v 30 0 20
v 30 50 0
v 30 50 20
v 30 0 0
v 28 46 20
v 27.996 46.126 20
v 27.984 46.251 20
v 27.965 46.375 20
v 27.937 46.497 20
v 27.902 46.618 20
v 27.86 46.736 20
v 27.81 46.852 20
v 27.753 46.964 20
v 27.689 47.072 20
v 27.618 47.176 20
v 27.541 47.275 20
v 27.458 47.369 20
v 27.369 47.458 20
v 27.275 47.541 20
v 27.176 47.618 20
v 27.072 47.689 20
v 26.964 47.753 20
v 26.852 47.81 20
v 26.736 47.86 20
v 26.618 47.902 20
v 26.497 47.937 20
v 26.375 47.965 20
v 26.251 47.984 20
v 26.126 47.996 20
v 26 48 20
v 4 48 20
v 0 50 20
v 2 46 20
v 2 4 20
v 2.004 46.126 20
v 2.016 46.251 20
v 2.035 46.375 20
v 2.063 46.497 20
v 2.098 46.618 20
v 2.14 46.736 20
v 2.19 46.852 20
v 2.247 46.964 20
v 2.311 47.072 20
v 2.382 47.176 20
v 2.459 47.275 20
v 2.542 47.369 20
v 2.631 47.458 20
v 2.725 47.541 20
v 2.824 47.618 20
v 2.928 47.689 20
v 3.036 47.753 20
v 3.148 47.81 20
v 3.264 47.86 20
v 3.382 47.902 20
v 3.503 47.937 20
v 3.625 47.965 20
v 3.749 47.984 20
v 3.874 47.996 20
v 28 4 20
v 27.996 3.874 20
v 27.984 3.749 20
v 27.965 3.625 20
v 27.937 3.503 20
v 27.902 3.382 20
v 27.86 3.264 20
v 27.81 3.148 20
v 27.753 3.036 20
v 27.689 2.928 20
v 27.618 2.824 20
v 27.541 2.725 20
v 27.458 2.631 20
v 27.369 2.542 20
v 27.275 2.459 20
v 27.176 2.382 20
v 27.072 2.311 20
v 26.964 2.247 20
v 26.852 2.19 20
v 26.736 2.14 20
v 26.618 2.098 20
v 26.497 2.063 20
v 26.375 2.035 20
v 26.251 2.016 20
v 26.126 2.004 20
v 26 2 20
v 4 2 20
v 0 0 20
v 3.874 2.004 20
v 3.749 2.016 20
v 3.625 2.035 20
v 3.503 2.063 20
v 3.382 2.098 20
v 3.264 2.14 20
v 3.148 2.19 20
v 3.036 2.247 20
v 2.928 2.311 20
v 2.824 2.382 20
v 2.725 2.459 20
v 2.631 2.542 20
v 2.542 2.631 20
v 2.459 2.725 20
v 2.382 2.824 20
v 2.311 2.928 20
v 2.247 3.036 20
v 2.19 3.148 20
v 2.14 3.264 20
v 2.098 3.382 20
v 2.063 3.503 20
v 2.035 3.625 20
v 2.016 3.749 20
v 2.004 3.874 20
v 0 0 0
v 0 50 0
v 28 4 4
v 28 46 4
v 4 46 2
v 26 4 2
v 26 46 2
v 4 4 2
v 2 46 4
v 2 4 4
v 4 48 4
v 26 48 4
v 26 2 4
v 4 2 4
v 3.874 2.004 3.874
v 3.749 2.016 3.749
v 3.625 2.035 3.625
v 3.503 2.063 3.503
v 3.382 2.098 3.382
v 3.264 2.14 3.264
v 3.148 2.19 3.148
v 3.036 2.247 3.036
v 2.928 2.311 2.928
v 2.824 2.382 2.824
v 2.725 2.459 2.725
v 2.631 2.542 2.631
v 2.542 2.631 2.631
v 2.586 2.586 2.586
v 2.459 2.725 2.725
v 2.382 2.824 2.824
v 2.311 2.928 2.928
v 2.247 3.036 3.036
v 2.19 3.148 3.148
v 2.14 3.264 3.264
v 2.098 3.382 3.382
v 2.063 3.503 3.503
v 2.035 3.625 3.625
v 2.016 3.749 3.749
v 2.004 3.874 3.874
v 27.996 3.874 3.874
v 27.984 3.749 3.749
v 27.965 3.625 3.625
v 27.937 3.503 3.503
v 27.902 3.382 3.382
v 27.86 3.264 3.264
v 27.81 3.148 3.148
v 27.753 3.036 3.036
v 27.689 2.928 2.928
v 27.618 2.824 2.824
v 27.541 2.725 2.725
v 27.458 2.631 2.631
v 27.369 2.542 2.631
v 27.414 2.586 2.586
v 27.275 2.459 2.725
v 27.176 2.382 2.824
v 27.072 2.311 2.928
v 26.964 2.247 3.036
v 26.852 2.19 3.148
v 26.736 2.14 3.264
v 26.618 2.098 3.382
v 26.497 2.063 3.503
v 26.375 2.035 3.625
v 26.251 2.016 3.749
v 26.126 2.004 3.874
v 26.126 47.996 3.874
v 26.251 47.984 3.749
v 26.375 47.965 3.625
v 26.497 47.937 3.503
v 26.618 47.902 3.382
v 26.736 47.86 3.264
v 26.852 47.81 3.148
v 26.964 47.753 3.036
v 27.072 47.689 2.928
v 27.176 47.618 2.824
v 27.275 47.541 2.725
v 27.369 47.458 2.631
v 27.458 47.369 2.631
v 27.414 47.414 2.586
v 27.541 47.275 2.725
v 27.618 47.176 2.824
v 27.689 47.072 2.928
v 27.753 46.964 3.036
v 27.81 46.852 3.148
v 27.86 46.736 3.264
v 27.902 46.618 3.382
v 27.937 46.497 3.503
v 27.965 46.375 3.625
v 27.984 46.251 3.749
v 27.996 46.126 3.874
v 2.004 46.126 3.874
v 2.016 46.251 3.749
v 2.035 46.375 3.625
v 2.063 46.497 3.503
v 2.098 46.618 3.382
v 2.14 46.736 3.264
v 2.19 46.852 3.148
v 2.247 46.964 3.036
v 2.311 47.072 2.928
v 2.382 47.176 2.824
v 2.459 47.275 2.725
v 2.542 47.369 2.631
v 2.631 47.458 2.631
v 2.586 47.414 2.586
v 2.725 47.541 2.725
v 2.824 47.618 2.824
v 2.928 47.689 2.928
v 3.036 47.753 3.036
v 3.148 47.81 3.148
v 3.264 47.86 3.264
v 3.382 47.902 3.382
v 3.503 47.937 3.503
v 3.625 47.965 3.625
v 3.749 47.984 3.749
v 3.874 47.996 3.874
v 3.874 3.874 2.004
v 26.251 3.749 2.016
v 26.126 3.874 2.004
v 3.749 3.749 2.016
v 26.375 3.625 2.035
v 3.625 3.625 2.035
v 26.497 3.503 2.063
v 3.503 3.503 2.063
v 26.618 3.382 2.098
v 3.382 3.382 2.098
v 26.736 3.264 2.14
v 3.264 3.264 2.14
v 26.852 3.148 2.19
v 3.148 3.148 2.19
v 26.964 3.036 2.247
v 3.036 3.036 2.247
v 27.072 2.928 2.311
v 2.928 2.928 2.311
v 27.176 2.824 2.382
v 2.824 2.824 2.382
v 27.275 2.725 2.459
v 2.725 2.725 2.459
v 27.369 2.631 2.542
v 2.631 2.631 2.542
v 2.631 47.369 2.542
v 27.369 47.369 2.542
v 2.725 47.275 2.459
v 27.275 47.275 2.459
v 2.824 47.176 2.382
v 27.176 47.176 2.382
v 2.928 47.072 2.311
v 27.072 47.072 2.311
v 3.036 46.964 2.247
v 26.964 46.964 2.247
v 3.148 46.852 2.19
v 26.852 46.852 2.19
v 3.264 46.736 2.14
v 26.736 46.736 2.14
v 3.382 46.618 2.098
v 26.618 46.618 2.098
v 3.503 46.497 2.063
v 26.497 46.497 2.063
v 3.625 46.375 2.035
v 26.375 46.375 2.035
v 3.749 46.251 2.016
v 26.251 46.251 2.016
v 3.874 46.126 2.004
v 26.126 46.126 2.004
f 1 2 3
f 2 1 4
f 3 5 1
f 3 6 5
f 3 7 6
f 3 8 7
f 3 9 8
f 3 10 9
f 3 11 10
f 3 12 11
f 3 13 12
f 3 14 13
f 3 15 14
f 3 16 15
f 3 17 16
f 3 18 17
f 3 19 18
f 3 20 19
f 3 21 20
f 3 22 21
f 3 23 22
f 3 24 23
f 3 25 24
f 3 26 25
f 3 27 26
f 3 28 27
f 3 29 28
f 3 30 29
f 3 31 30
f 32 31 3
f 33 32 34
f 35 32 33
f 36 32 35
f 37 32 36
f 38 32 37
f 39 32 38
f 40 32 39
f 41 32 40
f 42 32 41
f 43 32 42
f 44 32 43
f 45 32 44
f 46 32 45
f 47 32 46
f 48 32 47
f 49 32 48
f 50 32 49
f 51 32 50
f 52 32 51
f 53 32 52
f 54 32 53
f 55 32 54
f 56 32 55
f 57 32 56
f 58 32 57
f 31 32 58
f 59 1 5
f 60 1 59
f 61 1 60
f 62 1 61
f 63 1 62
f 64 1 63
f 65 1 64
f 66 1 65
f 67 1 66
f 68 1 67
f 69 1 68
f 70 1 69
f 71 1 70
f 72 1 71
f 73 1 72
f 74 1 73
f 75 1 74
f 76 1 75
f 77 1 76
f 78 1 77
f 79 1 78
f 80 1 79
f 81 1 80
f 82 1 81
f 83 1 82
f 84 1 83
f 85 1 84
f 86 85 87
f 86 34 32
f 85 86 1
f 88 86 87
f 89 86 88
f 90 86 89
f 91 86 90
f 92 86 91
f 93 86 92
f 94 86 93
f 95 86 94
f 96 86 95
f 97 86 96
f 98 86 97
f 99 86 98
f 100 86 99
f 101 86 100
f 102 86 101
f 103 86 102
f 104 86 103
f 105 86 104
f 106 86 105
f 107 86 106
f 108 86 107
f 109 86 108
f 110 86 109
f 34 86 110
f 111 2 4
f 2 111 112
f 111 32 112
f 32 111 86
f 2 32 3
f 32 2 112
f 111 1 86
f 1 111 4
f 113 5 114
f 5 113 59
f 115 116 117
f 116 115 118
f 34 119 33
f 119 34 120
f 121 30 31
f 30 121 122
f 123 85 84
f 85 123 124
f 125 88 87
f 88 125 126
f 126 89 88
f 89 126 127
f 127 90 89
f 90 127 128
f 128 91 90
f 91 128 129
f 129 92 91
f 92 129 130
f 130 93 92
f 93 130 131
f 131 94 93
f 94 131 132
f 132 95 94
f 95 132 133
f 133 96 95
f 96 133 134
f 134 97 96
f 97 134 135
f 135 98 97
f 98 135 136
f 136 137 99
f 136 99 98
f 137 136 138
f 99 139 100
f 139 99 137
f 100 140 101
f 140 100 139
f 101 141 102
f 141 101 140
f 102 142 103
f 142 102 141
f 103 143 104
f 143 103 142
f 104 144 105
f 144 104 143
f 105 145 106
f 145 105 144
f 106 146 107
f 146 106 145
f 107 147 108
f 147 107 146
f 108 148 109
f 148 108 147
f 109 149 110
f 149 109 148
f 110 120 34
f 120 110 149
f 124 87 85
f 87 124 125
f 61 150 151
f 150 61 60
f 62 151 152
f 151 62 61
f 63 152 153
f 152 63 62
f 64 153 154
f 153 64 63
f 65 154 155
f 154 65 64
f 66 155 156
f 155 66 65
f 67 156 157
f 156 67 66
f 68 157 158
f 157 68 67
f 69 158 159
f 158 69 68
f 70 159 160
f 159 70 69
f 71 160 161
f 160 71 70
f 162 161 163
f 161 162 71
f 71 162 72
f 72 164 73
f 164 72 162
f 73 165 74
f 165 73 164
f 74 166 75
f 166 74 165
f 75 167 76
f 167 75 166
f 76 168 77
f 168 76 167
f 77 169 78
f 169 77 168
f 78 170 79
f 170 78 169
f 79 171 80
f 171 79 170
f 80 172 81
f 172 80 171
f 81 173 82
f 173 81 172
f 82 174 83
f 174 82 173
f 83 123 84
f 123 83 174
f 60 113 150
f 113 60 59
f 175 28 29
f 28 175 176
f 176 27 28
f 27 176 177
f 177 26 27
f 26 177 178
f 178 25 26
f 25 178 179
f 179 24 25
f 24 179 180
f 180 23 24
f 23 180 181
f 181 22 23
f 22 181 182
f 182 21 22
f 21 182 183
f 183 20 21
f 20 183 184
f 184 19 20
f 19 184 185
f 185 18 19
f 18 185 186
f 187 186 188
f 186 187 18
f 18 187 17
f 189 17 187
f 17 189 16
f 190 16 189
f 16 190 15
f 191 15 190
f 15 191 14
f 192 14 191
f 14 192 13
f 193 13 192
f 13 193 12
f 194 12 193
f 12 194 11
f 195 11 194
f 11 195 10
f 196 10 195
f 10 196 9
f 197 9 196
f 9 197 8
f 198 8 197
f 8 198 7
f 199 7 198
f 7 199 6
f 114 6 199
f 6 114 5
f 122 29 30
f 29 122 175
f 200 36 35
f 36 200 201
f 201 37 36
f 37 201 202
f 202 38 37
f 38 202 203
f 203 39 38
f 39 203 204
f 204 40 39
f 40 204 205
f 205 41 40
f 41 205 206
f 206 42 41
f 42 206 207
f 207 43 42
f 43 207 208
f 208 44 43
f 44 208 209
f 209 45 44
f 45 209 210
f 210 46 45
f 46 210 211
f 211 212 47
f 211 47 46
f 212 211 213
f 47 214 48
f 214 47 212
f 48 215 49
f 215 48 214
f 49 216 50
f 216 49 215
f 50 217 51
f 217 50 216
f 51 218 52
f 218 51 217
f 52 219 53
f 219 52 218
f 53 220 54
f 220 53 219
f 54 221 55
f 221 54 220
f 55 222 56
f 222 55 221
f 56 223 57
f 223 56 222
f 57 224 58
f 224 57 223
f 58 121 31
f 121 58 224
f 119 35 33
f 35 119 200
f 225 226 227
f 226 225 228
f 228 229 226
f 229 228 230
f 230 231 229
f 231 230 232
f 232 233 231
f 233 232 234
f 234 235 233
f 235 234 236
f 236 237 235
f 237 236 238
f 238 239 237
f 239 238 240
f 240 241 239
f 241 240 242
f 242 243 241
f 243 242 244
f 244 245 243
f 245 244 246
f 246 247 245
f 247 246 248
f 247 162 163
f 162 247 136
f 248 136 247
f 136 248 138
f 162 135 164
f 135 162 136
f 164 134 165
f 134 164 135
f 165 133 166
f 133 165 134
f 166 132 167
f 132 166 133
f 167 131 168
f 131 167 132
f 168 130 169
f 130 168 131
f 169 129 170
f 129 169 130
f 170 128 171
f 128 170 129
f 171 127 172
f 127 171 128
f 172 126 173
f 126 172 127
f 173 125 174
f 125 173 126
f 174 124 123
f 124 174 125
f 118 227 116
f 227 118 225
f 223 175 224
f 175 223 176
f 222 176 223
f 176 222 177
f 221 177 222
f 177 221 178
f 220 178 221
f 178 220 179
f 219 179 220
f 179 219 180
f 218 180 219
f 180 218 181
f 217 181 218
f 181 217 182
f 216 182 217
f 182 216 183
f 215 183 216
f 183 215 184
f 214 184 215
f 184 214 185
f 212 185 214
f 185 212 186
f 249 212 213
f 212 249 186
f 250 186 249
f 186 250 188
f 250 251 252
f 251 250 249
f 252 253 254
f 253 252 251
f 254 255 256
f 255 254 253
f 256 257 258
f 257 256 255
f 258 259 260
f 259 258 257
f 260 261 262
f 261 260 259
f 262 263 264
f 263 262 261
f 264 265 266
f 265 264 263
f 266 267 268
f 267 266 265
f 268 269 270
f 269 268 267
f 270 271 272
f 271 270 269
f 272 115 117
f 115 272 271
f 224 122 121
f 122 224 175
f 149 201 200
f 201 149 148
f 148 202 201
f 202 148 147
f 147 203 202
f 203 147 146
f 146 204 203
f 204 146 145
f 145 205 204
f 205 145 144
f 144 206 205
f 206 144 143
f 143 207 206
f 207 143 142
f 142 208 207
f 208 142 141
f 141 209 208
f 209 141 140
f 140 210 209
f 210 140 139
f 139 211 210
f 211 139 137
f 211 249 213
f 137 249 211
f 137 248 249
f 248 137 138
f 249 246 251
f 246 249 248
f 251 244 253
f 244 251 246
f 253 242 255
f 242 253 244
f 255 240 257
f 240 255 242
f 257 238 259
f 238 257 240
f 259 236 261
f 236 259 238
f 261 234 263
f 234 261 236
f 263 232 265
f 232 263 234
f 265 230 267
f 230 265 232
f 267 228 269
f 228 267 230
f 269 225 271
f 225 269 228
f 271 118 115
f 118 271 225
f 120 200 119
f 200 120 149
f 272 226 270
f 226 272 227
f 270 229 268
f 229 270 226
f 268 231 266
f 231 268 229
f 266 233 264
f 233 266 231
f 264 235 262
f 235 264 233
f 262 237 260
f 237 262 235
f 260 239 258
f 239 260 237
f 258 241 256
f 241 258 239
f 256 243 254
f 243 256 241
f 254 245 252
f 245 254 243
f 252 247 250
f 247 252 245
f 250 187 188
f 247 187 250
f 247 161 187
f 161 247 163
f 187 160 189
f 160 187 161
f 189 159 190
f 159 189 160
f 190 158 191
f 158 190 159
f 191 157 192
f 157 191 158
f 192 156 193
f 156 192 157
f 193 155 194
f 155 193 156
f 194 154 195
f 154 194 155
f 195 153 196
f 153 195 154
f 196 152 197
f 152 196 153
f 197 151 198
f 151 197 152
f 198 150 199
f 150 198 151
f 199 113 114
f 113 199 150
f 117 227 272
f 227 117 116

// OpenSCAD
$fn = 100;



difference() {
  cube([30, 50, 20]);
  translate([2, 2, 2]) cube([26, 46, 20]);
}


translate([2, 2, 2])
fillet(r=2, height=18);

translate([28, 2, 2])
rotate([0, 0, 90])
fillet(r=2, height=18);

translate([28, 48, 2])
rotate([0, 0, 180])
fillet(r=2, height=18);

translate([2, 48, 2])
rotate([0, 0, 270])
fillet(r=2, height=18);

translate([2, 2, 2])
rotate([0, 90, 0])
rotate([0, 0, 90])
fillet(r=2, height=26);

translate([2, 48, 2])
rotate([0, 90, 0])
rotate([0, 0, 180])
fillet(r=2, height=26);

translate([2, 2, 2])
rotate([270, 90, 0])
rotate([0, 0, 180])
fillet(r=2, height=46);

translate([28, 2, 2])
rotate([270, 90, 0])
rotate([0, 0, 90])
fillet(r=2, height=46);


module fillet(r, height) {
  linear_extrude(height=height) {
    translate([r/2, r/2, 0])
    difference() {
      square(r, center=true);
      translate([r/2, r/2, 0]) circle(r);
    }
  }
  ;
}
